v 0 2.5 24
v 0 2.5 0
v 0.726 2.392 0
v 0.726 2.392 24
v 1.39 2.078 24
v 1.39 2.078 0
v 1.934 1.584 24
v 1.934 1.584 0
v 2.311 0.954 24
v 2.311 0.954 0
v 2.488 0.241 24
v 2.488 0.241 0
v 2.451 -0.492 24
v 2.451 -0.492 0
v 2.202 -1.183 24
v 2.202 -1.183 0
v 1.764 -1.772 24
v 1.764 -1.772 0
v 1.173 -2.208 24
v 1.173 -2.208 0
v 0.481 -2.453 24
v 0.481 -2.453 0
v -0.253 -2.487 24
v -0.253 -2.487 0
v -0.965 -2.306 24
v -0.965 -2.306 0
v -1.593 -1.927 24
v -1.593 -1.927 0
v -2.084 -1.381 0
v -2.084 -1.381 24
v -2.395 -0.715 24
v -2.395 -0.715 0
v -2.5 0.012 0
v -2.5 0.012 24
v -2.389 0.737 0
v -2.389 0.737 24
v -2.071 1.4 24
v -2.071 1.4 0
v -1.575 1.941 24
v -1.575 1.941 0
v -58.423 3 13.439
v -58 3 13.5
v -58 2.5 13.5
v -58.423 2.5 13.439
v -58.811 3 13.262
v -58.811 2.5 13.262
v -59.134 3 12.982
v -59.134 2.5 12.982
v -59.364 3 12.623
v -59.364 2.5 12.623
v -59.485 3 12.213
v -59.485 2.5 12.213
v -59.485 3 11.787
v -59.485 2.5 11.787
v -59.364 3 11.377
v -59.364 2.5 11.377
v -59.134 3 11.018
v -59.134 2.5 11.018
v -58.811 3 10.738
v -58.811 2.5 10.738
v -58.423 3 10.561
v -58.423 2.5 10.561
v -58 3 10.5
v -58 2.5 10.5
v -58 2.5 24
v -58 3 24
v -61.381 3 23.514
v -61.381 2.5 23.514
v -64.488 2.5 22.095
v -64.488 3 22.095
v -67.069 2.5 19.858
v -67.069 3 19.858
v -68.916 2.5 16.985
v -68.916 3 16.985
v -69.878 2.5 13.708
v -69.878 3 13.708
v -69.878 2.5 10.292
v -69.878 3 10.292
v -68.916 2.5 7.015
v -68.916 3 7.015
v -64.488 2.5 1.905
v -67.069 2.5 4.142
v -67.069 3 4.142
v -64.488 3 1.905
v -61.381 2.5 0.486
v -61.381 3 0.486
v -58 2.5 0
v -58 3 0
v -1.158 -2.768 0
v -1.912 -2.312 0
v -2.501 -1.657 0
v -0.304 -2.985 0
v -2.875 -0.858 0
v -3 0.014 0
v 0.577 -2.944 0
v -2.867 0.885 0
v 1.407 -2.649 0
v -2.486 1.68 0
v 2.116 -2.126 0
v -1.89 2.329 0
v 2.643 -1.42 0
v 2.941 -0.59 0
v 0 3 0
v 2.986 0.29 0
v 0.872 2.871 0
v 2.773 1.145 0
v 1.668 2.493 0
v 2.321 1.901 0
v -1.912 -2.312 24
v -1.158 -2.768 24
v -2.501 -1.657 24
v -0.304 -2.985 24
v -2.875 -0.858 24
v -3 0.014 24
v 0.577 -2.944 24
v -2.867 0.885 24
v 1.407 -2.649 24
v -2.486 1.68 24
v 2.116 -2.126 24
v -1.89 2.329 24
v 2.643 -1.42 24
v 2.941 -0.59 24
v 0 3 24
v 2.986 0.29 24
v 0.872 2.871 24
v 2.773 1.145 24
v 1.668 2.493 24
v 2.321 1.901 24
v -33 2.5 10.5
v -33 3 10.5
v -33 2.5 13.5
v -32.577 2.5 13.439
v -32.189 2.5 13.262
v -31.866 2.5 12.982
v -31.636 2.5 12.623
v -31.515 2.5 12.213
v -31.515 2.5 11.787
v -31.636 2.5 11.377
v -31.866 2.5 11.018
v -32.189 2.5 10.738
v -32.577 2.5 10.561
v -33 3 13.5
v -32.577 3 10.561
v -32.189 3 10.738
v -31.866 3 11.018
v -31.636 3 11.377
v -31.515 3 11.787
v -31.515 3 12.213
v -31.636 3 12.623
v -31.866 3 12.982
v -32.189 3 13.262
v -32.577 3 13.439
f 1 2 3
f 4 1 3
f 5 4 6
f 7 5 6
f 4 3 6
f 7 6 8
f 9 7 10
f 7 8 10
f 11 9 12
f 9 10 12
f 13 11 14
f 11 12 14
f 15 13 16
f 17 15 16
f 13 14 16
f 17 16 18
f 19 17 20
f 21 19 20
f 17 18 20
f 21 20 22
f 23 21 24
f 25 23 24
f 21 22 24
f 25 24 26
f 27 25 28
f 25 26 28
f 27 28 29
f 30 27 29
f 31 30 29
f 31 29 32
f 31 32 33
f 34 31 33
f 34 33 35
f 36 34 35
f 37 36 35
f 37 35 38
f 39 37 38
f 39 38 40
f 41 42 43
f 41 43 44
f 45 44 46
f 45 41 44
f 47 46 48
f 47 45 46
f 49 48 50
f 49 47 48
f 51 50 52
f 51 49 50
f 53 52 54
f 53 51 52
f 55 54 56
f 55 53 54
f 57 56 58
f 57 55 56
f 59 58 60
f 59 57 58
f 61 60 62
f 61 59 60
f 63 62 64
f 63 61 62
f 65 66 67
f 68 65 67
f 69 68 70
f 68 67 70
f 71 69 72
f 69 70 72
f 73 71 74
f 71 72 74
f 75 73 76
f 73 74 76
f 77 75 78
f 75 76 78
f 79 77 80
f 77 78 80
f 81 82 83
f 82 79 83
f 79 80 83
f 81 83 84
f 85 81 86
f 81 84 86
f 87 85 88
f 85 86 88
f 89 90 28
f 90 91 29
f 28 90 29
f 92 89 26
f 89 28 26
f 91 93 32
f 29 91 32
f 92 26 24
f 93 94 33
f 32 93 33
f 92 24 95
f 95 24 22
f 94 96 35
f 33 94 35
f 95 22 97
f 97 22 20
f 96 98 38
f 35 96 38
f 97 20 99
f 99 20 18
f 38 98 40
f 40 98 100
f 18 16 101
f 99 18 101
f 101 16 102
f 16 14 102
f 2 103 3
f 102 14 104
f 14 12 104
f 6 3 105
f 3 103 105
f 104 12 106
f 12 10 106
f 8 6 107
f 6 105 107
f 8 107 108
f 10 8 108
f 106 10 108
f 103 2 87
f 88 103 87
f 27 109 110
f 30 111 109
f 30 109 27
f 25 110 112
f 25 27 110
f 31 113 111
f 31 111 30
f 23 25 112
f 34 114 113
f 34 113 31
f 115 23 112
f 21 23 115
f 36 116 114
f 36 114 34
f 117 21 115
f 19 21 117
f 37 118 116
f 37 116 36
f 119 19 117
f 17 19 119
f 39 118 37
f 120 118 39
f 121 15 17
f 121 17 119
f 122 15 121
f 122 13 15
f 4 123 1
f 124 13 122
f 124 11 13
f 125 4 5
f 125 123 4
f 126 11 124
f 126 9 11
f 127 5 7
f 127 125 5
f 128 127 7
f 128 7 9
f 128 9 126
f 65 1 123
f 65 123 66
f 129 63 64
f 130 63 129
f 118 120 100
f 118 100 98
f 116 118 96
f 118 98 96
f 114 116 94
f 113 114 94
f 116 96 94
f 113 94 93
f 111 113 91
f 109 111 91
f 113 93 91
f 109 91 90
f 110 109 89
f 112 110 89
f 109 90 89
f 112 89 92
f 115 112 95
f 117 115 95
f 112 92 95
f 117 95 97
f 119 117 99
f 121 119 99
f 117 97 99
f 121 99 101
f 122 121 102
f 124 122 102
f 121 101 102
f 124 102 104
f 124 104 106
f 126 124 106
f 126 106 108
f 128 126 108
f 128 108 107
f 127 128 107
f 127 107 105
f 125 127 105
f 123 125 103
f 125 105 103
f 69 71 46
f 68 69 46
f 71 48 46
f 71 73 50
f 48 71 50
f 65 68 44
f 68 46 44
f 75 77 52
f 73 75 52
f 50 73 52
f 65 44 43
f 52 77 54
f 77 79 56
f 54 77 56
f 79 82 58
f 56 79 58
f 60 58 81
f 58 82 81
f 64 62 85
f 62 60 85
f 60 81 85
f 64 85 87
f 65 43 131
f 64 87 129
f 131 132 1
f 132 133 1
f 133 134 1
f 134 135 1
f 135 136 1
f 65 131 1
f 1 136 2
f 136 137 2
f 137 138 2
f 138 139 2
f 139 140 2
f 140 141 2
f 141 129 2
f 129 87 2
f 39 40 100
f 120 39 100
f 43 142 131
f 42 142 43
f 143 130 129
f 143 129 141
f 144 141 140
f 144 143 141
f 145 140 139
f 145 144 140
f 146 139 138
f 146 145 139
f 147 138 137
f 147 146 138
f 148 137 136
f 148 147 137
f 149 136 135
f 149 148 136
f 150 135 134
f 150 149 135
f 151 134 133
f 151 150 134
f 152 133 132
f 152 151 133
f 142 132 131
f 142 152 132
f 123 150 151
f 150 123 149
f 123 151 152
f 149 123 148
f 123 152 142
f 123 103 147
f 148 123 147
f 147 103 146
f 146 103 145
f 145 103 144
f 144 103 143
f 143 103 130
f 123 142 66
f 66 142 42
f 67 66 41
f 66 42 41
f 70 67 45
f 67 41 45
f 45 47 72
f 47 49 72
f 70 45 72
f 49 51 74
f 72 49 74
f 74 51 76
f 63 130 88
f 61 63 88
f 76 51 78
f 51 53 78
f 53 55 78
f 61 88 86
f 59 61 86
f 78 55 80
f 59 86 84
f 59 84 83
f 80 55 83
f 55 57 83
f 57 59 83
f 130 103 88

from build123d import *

# Parameters (mm, degrees)
SALIENTE_EXTRUIR1_DEPTH = 24
CORTAR_EXTRUIR1_DEPTH   = 1


with BuildPart() as part:
    # Croquis1 → Saliente-Extruir1 (new body)
    with BuildSketch(Plane.XY):
        with BuildLine():
            Line((0, 3), (-70, 3))
            Line((-70, 3), (-70, 2.5))
            Line((-70, 2.5), (0, 2.5))
            ThreePointArc((0, 2.5), (0.835770646, -2.356159466), (-1.575367134, 1.941189942))
            Line((-1.575367134, 1.941189942), (-1.890440561, 2.329427931))
            ThreePointArc((-1.890440561, 2.329427931), (1.002924775, -2.827391359), (0, 3))
        make_face()
    extrude(amount=SALIENTE_EXTRUIR1_DEPTH)

    # Croquis2 → Cortar-Extruir1 (cut)
    with BuildSketch(Plane(origin=(0, 3, 0), x_dir=(1, 0, 0), z_dir=(0, 1, 0))):
        with BuildLine():
            Line((-58, -10.5), (-33, -10.5))
            ThreePointArc((-33, -10.5), (-31.5, -12), (-33, -13.5))
            Line((-33, -13.5), (-58, -13.5))
            ThreePointArc((-58, -13.5), (-59.5, -12), (-58, -10.5))
        make_face()
        with BuildLine():
            Line((-58, 0), (-75.765424477, 0))
            Line((-75.765424477, 0), (-75.765424477, -24))
            Line((-75.765424477, -24), (-58, -24))
            ThreePointArc((-58, -24), (-70, -12), (-58, 0))
        make_face()
    extrude(amount=-CORTAR_EXTRUIR1_DEPTH, mode=Mode.SUBTRACT)


solid = part.part
